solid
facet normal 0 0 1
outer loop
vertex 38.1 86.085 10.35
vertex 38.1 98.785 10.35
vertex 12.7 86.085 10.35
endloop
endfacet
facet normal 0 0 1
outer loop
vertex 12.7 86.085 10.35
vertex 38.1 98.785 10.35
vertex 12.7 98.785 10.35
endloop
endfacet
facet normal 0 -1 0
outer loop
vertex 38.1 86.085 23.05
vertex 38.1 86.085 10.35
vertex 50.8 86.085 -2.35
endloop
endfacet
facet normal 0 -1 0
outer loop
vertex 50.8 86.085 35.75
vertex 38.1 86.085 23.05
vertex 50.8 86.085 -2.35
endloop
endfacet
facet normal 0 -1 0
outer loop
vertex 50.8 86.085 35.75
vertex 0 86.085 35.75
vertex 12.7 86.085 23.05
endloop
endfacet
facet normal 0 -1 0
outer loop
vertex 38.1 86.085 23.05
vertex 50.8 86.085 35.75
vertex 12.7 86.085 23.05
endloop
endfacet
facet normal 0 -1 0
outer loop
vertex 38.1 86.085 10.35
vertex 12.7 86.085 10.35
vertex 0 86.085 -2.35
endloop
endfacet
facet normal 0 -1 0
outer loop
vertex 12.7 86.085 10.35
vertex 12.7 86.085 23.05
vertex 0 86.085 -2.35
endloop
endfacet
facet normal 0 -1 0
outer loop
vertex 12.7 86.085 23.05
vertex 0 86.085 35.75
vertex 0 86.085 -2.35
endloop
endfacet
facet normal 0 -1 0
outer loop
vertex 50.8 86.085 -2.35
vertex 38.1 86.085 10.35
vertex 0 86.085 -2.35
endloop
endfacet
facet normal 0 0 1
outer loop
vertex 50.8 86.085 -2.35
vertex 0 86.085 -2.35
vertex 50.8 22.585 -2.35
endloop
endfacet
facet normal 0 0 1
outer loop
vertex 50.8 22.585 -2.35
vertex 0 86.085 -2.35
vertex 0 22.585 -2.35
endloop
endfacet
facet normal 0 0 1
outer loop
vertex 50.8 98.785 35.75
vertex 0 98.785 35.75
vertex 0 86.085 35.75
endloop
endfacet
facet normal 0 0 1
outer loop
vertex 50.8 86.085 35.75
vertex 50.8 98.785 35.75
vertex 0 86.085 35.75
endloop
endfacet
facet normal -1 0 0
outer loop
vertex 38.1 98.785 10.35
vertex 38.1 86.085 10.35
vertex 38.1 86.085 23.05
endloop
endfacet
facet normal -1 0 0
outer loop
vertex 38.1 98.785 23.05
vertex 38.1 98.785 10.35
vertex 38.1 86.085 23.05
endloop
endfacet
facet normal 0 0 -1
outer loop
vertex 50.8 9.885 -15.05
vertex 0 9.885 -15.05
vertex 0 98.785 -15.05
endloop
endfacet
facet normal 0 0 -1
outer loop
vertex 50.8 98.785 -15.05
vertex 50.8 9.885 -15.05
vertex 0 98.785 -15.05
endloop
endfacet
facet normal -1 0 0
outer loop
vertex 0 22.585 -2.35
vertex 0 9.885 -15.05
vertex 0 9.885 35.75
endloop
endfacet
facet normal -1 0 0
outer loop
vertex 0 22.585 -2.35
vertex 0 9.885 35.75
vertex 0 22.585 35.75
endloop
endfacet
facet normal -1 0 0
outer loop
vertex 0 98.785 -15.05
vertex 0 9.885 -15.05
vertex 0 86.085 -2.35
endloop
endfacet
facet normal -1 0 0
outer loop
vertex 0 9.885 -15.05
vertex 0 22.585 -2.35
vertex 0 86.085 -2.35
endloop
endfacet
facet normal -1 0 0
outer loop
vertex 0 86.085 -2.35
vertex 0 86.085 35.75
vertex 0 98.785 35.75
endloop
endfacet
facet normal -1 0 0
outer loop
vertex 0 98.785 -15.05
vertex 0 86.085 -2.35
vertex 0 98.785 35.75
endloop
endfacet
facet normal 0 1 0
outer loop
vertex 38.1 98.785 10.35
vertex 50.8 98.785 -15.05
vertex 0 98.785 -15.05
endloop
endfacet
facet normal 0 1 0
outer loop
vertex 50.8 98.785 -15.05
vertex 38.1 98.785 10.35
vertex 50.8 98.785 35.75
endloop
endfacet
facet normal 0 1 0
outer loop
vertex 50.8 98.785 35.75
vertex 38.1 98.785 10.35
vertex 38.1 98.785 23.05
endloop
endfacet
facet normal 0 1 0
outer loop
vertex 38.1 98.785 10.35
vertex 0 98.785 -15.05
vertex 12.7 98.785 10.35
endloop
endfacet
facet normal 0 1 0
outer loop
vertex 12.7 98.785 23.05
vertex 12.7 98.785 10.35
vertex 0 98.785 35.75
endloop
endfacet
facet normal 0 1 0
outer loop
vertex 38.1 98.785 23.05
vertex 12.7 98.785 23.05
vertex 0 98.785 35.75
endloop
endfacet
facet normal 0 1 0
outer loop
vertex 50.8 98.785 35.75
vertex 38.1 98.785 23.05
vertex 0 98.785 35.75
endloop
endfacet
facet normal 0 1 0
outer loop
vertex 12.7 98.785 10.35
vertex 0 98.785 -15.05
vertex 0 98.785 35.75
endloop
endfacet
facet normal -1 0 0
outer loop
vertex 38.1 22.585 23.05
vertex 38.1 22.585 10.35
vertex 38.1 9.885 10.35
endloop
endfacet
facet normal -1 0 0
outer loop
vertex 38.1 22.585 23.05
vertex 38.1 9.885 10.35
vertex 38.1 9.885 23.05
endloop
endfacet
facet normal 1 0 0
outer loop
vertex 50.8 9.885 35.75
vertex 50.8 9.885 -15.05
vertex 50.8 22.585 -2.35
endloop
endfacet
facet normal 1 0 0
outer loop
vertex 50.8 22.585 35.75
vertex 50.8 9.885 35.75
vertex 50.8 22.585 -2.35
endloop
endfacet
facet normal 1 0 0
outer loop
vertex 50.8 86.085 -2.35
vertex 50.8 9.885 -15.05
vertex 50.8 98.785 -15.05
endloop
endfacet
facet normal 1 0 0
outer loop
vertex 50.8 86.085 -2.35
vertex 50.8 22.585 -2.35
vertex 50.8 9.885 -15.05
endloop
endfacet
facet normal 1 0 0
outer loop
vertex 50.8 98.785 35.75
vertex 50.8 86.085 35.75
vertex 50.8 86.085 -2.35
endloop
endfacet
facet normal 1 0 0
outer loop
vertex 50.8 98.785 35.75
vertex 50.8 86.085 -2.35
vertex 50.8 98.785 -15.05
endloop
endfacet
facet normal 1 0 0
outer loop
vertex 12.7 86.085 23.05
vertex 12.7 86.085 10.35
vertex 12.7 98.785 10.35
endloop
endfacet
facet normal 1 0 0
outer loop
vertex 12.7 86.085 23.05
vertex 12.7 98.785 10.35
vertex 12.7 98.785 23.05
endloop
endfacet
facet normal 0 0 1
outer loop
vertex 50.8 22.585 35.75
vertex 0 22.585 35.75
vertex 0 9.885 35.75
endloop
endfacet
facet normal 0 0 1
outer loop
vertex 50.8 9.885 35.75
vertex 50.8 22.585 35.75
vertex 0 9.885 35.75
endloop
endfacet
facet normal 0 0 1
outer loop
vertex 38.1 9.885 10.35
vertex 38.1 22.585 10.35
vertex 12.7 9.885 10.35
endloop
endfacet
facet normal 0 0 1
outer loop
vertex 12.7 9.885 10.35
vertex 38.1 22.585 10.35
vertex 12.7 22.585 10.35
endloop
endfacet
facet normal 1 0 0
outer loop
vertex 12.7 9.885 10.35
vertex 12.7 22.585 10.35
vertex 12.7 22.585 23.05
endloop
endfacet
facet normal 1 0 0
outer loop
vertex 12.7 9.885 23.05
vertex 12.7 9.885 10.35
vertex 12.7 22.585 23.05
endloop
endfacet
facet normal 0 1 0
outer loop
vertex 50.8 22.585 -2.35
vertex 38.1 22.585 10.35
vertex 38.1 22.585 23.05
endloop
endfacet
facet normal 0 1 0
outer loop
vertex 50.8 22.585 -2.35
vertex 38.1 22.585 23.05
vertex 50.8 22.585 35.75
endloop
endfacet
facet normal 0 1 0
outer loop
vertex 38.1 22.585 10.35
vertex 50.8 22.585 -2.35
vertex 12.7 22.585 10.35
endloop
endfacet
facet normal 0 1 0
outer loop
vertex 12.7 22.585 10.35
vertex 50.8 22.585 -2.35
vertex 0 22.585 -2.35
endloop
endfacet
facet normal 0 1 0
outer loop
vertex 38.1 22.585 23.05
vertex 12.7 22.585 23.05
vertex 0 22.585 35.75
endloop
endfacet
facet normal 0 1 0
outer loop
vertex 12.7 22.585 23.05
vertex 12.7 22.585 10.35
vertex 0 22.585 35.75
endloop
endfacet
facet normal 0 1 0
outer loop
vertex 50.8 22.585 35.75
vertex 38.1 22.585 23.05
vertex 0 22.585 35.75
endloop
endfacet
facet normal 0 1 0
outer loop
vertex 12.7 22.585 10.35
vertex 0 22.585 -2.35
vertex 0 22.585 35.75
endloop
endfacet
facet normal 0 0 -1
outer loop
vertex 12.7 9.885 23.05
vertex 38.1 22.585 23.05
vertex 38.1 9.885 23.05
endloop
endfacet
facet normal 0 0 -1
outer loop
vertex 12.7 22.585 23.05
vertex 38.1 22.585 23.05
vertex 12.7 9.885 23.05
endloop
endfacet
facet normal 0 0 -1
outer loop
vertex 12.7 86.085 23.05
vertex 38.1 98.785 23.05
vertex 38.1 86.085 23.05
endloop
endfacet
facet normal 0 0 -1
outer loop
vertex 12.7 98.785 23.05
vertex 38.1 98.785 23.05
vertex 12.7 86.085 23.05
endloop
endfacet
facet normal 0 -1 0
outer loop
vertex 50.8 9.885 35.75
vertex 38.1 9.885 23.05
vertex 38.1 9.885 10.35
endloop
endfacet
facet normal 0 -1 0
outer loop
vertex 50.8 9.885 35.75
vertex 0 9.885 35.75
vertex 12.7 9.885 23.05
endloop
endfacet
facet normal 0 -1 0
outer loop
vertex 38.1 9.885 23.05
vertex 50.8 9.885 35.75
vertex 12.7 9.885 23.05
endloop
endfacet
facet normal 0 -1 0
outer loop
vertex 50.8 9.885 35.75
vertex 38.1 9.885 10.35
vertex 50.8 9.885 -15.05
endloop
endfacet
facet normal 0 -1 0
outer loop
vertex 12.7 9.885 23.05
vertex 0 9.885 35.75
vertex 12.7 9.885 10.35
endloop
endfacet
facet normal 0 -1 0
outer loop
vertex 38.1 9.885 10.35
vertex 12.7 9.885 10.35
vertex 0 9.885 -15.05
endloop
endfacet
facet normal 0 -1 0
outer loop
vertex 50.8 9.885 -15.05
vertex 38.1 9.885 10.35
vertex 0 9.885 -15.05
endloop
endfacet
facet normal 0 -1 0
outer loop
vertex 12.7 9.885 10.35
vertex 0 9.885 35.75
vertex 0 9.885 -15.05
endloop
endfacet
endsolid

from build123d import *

# Parameters (mm, degrees)
F1_DEPTH = 50.8
F2_W     = 25.4
F2_H     = 12.7
F3_DEPTH = 88.9


with BuildPart() as f1:
    # F0 (on Right) → F1 (new body)
    with BuildSketch(Plane.YZ):
        Polygon((98.784957, 35.750121), (86.084957, 35.750121), (86.084957, -2.349879), (22.584957, -2.349879), (22.584957, 35.750121), (9.884957, 35.750121), (9.884957, -15.049879), (22.584957, -15.049879), (86.084957, -15.049879), (98.784957, -15.049879), align=None)
    extrude(amount=F1_DEPTH)

    # F2 (on face) → F3 (cut)
    with BuildSketch(Plane(origin=(0, 98.784957, 0), x_dir=(-1, 0, 0), z_dir=(0, 1, 0))):
        with Locations((-25.4, 16.700121)):
            Rectangle(F2_W, F2_H)
    extrude(amount=-F3_DEPTH, mode=Mode.SUBTRACT)


solid = f1.part
